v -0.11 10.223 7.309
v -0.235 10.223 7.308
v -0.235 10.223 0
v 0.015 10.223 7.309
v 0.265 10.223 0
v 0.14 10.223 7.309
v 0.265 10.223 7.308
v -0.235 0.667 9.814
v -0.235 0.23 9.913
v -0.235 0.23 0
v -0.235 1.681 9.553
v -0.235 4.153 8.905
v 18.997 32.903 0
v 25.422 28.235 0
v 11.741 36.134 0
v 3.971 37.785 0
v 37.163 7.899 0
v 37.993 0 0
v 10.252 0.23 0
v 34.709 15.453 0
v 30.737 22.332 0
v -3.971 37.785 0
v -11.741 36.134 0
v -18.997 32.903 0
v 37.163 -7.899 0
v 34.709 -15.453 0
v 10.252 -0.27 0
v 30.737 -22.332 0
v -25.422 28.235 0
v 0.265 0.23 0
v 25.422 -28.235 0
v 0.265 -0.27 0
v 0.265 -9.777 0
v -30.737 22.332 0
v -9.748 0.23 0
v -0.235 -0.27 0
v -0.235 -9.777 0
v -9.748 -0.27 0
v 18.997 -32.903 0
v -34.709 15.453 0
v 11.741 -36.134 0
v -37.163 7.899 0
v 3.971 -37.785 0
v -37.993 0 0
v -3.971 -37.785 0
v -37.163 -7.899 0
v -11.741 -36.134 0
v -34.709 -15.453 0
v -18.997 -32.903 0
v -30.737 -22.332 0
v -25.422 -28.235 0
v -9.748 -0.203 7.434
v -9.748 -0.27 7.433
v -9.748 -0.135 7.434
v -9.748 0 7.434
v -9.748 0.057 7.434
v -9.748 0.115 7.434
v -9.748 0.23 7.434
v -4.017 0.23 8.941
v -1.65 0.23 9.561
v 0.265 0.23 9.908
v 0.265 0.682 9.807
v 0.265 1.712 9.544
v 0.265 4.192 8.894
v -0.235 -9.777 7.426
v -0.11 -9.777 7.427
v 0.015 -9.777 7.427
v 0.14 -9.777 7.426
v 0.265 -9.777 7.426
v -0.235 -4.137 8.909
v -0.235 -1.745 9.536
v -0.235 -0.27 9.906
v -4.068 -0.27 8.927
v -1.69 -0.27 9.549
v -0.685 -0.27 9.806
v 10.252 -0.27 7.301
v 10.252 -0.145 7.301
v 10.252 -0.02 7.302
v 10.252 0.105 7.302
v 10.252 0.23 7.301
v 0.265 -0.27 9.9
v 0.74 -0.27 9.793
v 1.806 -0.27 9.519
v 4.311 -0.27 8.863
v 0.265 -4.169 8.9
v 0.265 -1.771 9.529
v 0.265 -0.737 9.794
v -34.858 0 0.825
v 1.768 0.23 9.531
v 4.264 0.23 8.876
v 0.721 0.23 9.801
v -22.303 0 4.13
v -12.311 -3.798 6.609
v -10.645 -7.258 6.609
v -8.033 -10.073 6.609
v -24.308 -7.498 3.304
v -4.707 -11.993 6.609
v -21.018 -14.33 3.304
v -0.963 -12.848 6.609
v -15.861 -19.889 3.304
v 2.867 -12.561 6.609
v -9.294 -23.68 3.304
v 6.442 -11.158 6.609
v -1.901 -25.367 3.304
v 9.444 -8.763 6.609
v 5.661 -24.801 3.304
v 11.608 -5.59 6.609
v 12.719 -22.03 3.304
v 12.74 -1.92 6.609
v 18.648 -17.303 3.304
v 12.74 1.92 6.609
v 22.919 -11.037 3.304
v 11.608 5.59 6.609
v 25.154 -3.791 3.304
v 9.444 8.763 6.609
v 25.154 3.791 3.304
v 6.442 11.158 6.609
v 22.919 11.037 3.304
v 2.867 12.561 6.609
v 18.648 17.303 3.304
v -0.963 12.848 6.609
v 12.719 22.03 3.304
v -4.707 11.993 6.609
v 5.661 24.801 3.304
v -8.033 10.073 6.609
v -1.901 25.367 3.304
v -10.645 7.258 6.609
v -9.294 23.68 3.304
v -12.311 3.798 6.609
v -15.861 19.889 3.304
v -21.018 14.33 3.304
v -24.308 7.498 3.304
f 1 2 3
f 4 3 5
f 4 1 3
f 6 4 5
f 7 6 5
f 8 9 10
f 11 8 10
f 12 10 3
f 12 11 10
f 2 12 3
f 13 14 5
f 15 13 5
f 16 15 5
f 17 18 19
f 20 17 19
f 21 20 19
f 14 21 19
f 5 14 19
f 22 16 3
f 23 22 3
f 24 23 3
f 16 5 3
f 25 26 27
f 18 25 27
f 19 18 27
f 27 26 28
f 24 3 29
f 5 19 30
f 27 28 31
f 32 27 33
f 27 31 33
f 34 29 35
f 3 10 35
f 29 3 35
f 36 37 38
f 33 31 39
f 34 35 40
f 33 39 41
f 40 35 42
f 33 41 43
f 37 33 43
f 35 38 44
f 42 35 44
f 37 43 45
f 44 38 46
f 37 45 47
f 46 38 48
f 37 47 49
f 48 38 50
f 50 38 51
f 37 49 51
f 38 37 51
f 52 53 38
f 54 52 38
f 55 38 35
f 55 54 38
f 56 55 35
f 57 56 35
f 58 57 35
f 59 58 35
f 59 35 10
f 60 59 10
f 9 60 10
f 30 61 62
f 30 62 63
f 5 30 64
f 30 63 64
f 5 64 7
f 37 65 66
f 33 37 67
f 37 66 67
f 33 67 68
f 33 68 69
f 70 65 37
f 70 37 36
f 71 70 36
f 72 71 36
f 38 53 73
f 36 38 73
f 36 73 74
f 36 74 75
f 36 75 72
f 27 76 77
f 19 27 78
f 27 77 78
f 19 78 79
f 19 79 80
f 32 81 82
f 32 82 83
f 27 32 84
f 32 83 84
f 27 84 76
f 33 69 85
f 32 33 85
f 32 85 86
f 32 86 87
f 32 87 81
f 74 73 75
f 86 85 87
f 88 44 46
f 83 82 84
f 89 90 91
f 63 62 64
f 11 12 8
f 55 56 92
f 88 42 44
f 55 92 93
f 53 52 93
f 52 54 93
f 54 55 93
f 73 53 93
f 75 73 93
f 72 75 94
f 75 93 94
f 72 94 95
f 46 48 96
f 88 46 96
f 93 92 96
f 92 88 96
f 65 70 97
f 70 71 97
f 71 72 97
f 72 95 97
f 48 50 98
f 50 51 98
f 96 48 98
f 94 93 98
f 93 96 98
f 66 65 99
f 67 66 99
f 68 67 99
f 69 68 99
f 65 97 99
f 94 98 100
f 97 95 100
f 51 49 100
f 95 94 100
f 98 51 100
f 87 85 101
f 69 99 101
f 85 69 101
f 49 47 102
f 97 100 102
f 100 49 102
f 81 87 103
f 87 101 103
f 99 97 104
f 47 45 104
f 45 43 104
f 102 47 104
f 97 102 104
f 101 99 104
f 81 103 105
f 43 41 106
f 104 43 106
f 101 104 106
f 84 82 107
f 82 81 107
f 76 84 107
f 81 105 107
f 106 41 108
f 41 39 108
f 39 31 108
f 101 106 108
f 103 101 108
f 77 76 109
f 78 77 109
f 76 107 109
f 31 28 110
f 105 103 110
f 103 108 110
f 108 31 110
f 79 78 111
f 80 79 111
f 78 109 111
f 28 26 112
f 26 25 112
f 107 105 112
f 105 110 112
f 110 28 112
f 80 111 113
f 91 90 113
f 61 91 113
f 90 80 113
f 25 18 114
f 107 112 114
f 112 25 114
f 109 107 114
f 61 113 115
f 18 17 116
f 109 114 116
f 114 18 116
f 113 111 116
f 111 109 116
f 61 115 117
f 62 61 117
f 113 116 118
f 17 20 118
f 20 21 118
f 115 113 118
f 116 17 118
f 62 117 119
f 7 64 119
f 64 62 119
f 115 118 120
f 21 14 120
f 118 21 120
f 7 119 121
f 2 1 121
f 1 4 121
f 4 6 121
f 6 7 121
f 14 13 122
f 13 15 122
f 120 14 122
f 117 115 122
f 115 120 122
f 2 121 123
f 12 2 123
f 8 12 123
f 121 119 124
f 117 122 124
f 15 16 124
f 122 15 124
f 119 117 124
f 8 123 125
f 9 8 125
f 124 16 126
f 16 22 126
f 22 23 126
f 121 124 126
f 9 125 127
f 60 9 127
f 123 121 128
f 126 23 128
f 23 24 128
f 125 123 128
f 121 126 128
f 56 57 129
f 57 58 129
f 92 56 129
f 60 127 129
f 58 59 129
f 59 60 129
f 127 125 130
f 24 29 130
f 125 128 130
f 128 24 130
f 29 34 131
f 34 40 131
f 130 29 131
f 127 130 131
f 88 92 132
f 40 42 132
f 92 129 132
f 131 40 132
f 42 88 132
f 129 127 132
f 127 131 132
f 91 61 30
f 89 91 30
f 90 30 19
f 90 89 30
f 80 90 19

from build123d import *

# Parameters (mm, degrees)
F4_W     = 9.5127796691
F4_H     = 0.5
F4_W_2   = 0.5
F4_H_2   = 9.9936255533
F4_W_3   = 9.9872203309
F4_H_3   = 9.5063744467
F5_DEPTH = 25


with BuildPart() as f2:
    # F1 (on Front) → F2 (revolve)
    with BuildSketch(Plane.XZ):
        Polygon((0, 10), (-37.9932709038, 0), (0, 0), align=None)
    revolve(axis=Axis((0, 0, 0), (0, 0, 1)))

    # F4 (on offset) → F5 (cut)
    with BuildSketch(Plane.XY.offset(10.1)):
        with Locations((-4.9916676883, -0.0203696135)):
            Rectangle(F4_W, F4_H)
        with Locations((0.0147221462, 5.2264431631)):
            Rectangle(F4_W_2, F4_H_2)
        with Locations((0.0147221462, -0.0203696135)):
            Rectangle(F4_W_2, F4_H)
        with Locations((5.2583323117, -0.0203696135)):
            Rectangle(F4_W_3, F4_H)
        with Locations((0.0147221462, -5.0235568369)):
            Rectangle(F4_W_2, F4_H_3)
    extrude(amount=-F5_DEPTH, mode=Mode.SUBTRACT)


solid = f2.part
